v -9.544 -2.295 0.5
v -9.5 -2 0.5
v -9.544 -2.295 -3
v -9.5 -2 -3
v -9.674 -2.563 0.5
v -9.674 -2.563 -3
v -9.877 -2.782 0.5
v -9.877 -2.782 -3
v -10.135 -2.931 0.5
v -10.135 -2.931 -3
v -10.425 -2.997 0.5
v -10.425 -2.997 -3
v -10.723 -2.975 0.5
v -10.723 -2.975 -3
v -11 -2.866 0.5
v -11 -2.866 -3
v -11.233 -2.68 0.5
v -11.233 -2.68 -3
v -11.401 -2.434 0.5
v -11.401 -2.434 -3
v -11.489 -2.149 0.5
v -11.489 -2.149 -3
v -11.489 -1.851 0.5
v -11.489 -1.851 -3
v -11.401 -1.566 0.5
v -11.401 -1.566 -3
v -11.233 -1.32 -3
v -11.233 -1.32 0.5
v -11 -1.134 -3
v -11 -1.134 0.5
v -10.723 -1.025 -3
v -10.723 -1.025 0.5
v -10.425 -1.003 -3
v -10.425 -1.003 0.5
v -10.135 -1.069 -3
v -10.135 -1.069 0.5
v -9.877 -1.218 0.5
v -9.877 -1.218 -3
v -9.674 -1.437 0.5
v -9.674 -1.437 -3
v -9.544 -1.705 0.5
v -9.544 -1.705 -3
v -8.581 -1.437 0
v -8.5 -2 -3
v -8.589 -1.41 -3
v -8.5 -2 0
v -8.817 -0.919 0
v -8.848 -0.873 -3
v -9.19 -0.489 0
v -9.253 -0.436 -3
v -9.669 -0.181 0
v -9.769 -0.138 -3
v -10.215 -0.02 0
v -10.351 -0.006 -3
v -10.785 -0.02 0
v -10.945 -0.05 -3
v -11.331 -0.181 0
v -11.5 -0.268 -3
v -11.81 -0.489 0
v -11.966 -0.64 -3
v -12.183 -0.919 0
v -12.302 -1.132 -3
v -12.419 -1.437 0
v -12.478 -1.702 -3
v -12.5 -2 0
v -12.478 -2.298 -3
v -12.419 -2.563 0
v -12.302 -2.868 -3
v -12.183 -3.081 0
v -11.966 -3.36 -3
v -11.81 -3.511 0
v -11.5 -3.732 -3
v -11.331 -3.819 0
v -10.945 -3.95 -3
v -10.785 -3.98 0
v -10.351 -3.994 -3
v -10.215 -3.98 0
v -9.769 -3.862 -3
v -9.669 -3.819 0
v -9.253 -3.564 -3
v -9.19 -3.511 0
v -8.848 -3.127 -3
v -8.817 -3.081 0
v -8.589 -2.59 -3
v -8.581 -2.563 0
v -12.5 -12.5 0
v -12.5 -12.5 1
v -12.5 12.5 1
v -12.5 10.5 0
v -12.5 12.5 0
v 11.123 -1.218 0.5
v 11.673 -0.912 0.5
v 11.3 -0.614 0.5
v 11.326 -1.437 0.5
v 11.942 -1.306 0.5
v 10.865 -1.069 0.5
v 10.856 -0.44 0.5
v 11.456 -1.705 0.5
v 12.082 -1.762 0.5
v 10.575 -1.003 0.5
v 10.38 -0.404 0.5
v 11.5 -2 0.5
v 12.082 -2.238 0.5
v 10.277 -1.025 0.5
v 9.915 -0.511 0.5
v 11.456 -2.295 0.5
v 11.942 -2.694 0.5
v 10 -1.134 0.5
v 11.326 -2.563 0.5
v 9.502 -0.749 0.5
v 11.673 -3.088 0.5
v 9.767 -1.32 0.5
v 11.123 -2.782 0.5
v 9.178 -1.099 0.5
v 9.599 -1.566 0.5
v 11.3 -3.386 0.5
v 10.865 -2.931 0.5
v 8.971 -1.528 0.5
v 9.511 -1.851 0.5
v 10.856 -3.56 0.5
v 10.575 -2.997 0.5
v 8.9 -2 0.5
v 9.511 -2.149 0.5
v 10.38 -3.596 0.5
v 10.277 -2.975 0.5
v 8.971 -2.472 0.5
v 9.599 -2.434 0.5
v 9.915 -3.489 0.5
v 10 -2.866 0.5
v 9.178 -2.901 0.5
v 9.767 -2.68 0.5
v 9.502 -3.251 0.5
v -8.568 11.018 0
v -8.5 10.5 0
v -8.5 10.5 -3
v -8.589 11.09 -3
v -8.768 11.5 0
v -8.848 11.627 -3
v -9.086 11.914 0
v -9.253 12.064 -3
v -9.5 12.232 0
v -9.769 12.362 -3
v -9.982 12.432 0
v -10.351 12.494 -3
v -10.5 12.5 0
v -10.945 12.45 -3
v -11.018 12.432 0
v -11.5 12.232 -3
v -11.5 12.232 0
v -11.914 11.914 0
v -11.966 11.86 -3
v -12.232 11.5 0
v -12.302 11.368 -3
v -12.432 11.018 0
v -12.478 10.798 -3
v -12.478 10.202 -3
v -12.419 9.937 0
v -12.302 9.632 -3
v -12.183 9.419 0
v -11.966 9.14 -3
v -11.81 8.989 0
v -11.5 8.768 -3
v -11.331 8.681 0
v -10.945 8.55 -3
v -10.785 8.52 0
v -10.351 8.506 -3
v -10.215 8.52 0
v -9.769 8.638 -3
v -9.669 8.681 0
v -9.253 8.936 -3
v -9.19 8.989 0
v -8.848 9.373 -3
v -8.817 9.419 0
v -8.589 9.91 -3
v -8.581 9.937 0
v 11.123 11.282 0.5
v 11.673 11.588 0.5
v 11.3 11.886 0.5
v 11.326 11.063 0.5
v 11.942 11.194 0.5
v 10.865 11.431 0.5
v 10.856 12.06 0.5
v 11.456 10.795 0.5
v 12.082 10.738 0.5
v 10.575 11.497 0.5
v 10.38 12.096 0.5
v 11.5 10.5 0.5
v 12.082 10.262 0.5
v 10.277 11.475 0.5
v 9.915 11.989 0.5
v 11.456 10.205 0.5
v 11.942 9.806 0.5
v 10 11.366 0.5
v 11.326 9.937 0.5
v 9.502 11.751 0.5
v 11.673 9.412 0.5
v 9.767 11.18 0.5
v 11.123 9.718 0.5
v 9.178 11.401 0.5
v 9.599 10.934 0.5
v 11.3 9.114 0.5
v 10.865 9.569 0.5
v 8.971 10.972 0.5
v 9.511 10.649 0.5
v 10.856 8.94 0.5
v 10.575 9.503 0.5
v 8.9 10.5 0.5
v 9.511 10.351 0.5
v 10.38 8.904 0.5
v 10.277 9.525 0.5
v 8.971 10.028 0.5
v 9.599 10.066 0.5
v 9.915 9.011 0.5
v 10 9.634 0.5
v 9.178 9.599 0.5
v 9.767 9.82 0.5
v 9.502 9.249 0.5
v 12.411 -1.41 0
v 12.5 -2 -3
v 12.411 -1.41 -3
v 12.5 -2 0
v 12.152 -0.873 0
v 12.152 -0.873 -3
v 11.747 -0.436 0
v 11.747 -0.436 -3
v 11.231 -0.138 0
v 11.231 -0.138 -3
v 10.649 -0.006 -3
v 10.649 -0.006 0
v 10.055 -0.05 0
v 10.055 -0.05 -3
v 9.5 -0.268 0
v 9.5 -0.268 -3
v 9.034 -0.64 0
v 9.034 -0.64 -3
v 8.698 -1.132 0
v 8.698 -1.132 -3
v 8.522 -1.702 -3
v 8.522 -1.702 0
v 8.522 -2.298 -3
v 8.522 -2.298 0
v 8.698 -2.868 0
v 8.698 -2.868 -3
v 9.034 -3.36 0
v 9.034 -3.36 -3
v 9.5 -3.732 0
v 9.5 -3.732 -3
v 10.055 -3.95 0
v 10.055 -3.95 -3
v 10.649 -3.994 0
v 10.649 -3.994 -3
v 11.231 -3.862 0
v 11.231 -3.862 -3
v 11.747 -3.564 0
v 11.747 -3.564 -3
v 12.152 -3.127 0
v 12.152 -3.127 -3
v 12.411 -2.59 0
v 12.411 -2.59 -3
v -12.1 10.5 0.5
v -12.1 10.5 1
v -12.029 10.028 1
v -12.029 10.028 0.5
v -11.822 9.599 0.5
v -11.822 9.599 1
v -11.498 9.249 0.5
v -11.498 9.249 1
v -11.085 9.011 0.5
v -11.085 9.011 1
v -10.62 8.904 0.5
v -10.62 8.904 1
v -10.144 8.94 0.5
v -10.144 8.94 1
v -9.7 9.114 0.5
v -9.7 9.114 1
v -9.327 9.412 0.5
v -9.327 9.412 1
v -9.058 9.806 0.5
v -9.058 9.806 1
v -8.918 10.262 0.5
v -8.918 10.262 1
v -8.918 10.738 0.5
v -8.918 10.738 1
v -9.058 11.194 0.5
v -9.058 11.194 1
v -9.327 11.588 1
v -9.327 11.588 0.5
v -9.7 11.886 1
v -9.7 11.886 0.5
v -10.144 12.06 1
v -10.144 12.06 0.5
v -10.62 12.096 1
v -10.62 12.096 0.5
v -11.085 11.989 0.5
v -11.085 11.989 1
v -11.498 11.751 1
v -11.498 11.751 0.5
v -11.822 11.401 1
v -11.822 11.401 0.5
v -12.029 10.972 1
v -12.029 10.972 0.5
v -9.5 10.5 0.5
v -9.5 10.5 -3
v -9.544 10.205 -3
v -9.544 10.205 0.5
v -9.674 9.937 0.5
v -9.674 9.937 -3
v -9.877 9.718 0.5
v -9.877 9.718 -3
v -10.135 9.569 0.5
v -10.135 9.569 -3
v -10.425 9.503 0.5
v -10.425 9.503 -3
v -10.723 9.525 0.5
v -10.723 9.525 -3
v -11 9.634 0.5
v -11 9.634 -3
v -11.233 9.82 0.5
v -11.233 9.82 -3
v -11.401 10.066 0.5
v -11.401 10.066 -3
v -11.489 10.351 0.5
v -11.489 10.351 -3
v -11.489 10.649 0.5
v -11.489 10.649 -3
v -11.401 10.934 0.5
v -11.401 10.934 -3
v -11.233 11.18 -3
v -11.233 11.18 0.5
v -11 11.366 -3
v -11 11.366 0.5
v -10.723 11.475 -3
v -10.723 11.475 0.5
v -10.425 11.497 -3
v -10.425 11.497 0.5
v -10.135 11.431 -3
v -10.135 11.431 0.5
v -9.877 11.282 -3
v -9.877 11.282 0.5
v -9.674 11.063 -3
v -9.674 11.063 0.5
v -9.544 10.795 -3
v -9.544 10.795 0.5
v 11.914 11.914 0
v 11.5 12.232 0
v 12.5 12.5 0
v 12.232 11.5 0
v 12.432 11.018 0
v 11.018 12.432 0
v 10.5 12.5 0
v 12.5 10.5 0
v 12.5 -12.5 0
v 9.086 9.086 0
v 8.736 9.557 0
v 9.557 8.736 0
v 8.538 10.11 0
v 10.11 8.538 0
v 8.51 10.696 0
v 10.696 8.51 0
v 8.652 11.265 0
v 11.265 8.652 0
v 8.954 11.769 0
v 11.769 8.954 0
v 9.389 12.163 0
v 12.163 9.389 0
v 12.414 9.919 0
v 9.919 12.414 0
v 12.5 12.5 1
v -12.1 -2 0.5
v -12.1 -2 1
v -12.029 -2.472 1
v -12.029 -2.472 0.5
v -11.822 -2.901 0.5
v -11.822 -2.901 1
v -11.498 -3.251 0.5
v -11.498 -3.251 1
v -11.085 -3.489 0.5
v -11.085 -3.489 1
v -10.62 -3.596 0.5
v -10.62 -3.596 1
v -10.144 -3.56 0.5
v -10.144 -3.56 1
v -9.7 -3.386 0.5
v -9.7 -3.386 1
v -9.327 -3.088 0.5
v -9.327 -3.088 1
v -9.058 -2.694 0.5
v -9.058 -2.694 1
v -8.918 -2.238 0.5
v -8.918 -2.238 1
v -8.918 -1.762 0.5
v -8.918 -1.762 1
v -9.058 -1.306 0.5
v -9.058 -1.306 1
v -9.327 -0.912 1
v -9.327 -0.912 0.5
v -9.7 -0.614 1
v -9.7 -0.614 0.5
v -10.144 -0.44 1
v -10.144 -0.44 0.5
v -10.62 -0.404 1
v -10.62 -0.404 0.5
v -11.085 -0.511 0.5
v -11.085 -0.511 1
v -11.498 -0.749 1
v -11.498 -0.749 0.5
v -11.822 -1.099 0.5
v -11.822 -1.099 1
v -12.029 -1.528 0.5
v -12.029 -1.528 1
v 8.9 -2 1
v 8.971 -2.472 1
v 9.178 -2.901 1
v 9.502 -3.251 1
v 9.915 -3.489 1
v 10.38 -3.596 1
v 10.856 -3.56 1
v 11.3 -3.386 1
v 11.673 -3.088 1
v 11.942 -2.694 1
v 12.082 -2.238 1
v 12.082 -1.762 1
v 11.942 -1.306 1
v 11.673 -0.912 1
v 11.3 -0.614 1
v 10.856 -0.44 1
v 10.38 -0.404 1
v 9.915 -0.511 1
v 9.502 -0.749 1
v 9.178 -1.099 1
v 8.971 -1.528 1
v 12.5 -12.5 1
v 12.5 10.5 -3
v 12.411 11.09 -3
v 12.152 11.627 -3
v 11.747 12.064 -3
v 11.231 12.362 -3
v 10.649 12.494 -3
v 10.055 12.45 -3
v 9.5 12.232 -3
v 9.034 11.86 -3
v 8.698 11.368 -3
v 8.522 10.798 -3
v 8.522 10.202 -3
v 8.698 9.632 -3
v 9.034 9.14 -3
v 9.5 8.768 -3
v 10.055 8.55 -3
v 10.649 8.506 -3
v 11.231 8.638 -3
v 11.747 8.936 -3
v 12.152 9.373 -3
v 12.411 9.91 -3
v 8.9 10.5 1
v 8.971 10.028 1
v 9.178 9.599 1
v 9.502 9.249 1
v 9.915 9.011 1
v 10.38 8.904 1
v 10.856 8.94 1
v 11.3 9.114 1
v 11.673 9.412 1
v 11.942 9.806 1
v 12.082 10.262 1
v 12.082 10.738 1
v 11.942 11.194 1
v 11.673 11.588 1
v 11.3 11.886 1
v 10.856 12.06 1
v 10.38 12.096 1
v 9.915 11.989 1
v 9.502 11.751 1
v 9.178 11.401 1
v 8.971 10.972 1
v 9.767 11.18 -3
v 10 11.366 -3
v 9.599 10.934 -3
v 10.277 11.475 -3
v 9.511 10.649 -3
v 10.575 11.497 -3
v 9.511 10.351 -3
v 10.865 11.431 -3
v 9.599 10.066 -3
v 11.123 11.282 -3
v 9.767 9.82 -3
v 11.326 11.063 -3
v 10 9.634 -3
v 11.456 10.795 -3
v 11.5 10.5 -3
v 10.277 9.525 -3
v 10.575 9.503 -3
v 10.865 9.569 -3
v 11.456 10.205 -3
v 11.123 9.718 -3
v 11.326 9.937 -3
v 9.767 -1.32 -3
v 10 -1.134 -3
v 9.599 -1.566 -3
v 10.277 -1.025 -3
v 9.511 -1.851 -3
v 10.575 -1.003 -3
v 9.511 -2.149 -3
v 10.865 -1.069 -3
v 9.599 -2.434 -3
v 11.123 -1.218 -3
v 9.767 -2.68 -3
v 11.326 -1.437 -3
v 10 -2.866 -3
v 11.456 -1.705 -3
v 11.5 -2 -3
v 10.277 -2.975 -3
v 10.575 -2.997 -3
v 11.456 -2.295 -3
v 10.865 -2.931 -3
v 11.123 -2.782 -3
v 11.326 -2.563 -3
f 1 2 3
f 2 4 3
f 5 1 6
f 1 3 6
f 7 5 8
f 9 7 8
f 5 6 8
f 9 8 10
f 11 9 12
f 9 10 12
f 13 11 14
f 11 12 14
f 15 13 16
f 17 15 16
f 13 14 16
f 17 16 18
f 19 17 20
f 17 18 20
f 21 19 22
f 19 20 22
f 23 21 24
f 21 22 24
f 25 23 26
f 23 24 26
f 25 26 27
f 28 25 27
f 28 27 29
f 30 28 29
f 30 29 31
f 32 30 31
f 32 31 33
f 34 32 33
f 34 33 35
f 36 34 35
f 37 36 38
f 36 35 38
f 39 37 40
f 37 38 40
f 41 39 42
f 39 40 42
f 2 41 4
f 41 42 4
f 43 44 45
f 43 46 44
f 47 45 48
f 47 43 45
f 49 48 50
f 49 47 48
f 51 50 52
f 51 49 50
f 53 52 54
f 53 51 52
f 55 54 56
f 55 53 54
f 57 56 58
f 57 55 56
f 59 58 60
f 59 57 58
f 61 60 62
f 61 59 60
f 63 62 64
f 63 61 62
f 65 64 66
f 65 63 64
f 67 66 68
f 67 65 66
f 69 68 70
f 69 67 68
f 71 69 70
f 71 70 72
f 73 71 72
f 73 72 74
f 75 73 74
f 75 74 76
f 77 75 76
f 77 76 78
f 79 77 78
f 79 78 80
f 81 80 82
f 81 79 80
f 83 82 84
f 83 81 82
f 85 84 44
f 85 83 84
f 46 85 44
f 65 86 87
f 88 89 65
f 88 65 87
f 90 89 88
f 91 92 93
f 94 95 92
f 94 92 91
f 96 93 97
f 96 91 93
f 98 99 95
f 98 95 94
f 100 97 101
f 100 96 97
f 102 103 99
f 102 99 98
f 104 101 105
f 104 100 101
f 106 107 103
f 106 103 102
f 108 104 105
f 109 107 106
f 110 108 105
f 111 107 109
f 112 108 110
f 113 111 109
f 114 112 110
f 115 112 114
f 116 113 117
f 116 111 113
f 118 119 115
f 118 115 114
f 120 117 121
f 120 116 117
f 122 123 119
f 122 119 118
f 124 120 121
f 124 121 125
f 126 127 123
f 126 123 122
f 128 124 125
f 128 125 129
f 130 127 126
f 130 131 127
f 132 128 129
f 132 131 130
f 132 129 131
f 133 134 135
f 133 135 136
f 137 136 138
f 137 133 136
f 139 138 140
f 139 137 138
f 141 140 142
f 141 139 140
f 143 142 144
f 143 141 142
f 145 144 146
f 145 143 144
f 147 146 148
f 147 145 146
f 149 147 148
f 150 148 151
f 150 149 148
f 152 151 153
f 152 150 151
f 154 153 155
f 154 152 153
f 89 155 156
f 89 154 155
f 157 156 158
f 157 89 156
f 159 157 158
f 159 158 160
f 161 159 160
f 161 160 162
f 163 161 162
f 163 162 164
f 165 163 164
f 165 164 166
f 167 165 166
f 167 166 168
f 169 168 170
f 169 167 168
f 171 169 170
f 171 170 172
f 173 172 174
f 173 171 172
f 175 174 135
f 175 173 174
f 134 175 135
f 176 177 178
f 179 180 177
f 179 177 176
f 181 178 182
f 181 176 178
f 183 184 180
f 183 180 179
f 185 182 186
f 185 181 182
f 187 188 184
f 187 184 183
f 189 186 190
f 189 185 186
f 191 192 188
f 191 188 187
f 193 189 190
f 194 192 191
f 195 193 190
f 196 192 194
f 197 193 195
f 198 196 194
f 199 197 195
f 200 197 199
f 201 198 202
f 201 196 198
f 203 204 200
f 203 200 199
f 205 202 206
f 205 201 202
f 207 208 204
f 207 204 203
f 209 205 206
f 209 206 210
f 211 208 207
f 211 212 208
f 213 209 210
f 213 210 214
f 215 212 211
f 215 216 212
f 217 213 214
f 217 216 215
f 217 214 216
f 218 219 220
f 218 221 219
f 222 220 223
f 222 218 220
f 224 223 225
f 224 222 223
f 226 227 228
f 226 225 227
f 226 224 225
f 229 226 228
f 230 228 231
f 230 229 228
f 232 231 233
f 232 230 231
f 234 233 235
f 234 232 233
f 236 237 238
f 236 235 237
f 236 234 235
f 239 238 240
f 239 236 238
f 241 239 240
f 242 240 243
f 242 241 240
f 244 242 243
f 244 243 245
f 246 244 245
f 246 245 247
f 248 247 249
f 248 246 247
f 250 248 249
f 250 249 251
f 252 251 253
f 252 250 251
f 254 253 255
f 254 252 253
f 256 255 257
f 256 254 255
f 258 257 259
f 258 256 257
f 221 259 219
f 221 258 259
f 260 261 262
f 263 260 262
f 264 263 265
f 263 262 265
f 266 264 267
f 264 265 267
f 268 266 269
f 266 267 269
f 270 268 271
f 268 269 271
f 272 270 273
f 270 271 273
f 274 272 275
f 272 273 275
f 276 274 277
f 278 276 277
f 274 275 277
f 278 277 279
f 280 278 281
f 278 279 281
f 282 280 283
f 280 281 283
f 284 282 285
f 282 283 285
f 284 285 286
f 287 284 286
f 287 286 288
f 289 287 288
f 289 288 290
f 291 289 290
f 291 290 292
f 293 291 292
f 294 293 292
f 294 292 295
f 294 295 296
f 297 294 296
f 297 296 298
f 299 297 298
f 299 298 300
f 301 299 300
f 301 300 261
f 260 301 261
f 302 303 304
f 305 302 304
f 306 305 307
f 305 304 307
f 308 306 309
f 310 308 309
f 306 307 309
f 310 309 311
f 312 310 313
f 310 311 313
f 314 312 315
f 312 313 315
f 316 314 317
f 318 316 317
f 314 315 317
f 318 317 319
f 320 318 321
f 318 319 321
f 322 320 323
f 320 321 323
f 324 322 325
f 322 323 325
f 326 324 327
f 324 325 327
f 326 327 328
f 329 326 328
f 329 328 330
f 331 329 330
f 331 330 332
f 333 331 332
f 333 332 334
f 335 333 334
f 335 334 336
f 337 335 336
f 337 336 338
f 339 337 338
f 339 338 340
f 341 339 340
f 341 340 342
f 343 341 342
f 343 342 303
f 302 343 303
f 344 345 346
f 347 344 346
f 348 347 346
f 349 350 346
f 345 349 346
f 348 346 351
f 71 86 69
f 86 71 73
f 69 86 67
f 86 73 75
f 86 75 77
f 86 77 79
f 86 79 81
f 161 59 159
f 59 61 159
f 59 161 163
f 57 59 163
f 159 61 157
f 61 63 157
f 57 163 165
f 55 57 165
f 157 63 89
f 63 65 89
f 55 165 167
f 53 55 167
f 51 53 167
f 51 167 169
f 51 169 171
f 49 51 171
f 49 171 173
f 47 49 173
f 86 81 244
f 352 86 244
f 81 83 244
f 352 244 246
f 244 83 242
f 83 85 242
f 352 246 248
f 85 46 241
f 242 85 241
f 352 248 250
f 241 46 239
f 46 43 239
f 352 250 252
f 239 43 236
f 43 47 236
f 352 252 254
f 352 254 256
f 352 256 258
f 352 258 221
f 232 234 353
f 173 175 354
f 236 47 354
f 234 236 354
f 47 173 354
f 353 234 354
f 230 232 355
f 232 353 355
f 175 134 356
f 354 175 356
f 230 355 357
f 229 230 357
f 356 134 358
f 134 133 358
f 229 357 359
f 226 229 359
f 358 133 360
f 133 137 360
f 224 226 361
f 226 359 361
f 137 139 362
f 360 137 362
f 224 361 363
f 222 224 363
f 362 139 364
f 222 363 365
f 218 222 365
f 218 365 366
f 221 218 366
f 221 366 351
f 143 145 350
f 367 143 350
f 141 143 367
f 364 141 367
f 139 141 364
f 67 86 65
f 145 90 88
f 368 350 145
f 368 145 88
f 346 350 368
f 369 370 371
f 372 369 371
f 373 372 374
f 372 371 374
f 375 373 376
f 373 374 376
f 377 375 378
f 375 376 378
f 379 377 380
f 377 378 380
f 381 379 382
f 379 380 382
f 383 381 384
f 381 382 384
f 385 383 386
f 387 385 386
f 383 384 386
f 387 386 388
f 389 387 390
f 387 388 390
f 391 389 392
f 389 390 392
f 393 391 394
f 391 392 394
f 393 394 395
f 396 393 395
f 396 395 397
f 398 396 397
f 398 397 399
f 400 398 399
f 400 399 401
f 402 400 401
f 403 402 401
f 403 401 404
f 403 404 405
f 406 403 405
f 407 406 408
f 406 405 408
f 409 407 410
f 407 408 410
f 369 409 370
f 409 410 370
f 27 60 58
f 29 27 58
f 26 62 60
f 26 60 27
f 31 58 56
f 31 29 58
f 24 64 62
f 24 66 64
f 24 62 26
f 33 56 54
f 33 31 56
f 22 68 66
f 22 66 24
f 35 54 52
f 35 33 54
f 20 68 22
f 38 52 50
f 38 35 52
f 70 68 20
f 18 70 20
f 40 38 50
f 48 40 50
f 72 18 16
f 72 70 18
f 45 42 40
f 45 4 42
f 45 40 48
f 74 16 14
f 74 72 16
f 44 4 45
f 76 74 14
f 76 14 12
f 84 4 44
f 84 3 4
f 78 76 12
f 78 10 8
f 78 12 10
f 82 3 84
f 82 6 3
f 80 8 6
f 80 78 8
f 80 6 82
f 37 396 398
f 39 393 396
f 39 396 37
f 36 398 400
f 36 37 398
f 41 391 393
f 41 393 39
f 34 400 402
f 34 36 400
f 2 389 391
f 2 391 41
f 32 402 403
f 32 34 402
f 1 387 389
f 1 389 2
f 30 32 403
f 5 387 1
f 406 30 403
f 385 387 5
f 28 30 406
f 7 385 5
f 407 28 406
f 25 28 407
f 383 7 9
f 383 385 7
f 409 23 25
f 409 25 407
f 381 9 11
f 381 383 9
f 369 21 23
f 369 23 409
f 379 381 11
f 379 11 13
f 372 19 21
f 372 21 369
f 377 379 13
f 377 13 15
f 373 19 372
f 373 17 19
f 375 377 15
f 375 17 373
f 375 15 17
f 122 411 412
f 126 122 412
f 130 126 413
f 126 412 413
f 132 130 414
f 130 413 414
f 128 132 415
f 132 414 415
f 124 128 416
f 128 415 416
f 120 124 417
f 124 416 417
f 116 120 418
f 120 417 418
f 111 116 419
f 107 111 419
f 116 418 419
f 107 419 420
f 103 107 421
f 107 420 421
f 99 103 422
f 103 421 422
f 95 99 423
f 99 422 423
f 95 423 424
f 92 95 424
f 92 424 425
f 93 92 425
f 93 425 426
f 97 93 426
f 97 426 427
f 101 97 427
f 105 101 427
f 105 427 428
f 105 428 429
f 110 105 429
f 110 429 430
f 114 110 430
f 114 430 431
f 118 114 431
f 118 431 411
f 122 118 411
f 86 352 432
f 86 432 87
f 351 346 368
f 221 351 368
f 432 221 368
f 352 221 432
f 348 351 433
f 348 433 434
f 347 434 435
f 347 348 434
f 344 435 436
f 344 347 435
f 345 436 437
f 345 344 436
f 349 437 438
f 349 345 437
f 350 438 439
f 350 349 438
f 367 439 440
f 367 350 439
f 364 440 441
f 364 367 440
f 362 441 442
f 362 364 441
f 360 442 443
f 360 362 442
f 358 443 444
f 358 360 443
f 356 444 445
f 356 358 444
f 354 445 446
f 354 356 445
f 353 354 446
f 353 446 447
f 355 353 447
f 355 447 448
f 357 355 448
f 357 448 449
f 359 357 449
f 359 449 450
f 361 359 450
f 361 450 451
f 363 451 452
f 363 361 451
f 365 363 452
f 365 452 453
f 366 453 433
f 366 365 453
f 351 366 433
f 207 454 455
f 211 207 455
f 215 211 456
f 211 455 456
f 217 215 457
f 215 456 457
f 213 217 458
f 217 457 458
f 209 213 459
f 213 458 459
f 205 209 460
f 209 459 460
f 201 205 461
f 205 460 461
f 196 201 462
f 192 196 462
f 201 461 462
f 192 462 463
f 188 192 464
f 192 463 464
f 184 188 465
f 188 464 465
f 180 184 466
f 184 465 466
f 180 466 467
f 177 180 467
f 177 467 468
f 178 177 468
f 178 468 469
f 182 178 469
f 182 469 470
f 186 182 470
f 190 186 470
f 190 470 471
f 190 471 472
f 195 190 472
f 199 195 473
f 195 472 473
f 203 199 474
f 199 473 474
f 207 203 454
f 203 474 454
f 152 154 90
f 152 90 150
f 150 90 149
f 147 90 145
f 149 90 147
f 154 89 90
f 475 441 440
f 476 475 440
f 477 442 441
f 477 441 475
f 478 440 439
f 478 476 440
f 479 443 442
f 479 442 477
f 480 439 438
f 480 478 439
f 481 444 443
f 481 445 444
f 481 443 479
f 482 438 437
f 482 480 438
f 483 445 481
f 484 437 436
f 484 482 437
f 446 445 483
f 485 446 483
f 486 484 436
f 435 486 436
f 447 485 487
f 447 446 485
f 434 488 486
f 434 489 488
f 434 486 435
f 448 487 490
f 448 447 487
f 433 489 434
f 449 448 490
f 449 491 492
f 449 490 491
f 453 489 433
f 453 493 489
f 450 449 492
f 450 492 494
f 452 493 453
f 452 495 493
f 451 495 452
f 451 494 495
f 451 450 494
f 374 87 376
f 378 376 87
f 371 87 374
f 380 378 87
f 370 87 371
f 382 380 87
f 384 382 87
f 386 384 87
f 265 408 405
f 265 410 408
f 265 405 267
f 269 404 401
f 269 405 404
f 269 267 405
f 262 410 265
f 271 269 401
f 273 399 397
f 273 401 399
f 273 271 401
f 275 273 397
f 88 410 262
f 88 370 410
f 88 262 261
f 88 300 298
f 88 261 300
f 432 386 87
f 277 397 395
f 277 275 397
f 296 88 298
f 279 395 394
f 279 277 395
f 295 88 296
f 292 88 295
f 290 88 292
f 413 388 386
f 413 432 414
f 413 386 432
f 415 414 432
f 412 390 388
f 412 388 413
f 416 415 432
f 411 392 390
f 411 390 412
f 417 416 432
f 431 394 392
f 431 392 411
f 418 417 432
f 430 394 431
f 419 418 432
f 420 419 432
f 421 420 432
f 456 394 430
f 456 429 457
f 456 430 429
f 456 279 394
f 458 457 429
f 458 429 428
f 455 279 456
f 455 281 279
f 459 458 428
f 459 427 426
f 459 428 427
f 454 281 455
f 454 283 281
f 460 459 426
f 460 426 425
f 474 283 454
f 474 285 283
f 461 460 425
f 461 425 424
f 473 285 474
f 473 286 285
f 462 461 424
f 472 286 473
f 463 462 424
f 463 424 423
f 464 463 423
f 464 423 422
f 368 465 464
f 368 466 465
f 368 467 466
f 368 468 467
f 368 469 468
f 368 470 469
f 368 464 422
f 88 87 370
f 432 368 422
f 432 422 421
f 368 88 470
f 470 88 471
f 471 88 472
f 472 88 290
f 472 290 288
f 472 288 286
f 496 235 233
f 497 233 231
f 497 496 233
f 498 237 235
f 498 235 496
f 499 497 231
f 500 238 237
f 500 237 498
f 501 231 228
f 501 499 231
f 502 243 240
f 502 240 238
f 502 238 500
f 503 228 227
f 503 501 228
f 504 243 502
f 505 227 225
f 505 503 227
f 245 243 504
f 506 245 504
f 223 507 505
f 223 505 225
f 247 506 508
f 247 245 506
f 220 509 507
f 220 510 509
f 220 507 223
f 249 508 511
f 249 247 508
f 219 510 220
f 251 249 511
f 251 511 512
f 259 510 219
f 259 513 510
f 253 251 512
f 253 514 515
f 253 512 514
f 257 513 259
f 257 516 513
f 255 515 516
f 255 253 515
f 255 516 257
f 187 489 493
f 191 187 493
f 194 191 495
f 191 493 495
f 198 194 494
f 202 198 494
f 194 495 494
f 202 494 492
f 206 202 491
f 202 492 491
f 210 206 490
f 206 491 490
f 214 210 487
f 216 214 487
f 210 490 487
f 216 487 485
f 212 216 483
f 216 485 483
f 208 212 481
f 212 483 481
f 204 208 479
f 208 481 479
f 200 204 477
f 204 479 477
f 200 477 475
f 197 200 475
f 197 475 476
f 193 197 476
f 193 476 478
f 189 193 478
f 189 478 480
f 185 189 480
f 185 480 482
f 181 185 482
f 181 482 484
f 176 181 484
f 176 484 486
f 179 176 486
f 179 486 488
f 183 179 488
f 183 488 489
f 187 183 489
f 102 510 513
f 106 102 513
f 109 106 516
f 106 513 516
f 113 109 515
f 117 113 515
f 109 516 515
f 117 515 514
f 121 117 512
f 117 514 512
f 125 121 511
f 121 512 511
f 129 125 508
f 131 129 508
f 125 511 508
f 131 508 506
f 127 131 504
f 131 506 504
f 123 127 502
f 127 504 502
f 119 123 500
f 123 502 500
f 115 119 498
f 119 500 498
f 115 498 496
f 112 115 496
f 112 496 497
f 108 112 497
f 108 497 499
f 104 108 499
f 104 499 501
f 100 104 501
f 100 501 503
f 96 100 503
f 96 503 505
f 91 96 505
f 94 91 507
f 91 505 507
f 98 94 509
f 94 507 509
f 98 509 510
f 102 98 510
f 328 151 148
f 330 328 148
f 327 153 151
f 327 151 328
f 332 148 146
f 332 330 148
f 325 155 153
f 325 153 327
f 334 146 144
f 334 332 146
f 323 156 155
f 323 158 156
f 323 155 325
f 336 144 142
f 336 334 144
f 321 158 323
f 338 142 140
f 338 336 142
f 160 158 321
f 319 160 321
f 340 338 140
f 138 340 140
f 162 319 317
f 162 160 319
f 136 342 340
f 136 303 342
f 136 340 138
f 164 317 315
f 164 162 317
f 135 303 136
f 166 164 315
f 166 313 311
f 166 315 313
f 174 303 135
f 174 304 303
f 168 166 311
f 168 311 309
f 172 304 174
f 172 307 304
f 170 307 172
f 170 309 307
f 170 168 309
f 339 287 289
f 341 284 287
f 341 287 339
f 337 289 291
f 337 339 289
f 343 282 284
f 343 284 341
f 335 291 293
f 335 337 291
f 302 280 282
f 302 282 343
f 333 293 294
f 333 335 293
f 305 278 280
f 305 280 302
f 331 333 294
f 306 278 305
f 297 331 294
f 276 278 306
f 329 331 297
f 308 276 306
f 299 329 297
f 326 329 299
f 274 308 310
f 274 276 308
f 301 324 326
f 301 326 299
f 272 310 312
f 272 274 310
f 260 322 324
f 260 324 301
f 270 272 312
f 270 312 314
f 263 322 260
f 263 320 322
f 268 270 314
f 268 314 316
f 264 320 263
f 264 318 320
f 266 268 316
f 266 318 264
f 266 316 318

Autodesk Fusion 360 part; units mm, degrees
sketch "Esquisse1" plane through (0, 0, 0) normal (0, 0, 1) x (1, 0, 0)
  line L0 (-12.5, 12.5) -> (12.5, 12.5)
  line L1 (12.5, 12.5) -> (12.5, -12.5)
  line L2 (12.5, -12.5) -> (-12.5, -12.5)
  line L3 (-12.5, -12.5) -> (-12.5, 12.5)
  circle A0 centre (-10.5, 10.5) radius 1
  circle A1 centre (10.5, 10.5) radius 1
  circle A2 centre (-10.5, -2) radius 1
  circle A3 centre (10.5, -2) radius 1
  dimension "d1" = 25
  dimension "d2" = 25
  dimension "d3" = 12.5
  dimension "d4" = 12.5
  dimension "d5" = 21
  dimension "d6" = 2
  dimension "d7" = 2
  dimension "d8" = 2
  dimension "d9" = 2
  dimension "d10" = 2
  dimension "d11" = 12.5
  dimension "d12" = 12.5
  dimension "d13" = 21
  dimension "d14" = 2
  dimension "d15" = 2
  dimension "d16" = 2
  dimension "d17" = 2
extrude "Extrusion1" add sketch "Esquisse1" along normal blind 1
sketch "Esquisse2" plane through (0, 0, 0) normal (0, 0, -1) x (1, 0, 0)
  circle A0 centre (-10.5, 2) radius 1
  circle A1 centre (10.5, -10.5) radius 1
  circle A2 centre (10.5, 2) radius 1
  circle A3 centre (-10.5, -10.5) radius 1
  line L0 (12.5, 12.5) -> (-12.5, 12.5)
  line L1 (-12.5, 12.5) -> (-12.5, -12.5)
  line L2 (-12.5, -12.5) -> (12.5, -12.5)
  line L3 (12.5, -12.5) -> (12.5, 12.5)
  circle A4 centre (-10.5, -10.5) radius 2
  circle A5 centre (-10.5, 2) radius 2
  circle A6 centre (10.5, 2) radius 2
  circle A7 centre (10.5, -10.5) radius 2
  circle A8 centre (-10.5, 2) radius 1
  circle A9 centre (10.5, 2) radius 1
  circle A10 centre (-10.5, -10.5) radius 1
  circle A11 centre (10.5, -10.5) radius 1
  dimension "d20" = 4
  dimension "d21" = 4
  dimension "d22" = 4
  dimension "d23" = 4
  dimension "d26" = 2
extrude "Extrusion2" add sketch "Esquisse2" along normal blind 3 contours A5 | A6 | A7 | A4
sketch "Esquisse3" plane through (0, 0, 1) normal (0, 0, 1) x (-1, 0, 0)
  circle A0 centre (10.5, 2) radius 1
  circle A1 centre (-10.5, 2) radius 1
  circle A2 centre (-10.5, -10.5) radius 1
  circle A3 centre (10.5, -10.5) radius 1
  line L0 (12.5, 12.5) -> (-12.5, 12.5)
  line L1 (-12.5, 12.5) -> (-12.5, -12.5)
  line L2 (-12.5, -12.5) -> (12.5, -12.5)
  line L3 (12.5, -12.5) -> (12.5, 12.5)
  circle A4 centre (10.5, -10.5) radius 1.6
  circle A5 centre (-10.5, -10.5) radius 1.6
  circle A6 centre (-10.5, 2) radius 1.6
  circle A7 centre (10.5, 2) radius 1.6
  dimension "d27" = 3.2
  dimension "d28" = 3.2
  dimension "d29" = 3.2
  dimension "d30" = 3.2
extrude "Extrusion3" cut sketch "Esquisse3" against normal blind 0.5 contours A4 | A5 | A6 | A7
